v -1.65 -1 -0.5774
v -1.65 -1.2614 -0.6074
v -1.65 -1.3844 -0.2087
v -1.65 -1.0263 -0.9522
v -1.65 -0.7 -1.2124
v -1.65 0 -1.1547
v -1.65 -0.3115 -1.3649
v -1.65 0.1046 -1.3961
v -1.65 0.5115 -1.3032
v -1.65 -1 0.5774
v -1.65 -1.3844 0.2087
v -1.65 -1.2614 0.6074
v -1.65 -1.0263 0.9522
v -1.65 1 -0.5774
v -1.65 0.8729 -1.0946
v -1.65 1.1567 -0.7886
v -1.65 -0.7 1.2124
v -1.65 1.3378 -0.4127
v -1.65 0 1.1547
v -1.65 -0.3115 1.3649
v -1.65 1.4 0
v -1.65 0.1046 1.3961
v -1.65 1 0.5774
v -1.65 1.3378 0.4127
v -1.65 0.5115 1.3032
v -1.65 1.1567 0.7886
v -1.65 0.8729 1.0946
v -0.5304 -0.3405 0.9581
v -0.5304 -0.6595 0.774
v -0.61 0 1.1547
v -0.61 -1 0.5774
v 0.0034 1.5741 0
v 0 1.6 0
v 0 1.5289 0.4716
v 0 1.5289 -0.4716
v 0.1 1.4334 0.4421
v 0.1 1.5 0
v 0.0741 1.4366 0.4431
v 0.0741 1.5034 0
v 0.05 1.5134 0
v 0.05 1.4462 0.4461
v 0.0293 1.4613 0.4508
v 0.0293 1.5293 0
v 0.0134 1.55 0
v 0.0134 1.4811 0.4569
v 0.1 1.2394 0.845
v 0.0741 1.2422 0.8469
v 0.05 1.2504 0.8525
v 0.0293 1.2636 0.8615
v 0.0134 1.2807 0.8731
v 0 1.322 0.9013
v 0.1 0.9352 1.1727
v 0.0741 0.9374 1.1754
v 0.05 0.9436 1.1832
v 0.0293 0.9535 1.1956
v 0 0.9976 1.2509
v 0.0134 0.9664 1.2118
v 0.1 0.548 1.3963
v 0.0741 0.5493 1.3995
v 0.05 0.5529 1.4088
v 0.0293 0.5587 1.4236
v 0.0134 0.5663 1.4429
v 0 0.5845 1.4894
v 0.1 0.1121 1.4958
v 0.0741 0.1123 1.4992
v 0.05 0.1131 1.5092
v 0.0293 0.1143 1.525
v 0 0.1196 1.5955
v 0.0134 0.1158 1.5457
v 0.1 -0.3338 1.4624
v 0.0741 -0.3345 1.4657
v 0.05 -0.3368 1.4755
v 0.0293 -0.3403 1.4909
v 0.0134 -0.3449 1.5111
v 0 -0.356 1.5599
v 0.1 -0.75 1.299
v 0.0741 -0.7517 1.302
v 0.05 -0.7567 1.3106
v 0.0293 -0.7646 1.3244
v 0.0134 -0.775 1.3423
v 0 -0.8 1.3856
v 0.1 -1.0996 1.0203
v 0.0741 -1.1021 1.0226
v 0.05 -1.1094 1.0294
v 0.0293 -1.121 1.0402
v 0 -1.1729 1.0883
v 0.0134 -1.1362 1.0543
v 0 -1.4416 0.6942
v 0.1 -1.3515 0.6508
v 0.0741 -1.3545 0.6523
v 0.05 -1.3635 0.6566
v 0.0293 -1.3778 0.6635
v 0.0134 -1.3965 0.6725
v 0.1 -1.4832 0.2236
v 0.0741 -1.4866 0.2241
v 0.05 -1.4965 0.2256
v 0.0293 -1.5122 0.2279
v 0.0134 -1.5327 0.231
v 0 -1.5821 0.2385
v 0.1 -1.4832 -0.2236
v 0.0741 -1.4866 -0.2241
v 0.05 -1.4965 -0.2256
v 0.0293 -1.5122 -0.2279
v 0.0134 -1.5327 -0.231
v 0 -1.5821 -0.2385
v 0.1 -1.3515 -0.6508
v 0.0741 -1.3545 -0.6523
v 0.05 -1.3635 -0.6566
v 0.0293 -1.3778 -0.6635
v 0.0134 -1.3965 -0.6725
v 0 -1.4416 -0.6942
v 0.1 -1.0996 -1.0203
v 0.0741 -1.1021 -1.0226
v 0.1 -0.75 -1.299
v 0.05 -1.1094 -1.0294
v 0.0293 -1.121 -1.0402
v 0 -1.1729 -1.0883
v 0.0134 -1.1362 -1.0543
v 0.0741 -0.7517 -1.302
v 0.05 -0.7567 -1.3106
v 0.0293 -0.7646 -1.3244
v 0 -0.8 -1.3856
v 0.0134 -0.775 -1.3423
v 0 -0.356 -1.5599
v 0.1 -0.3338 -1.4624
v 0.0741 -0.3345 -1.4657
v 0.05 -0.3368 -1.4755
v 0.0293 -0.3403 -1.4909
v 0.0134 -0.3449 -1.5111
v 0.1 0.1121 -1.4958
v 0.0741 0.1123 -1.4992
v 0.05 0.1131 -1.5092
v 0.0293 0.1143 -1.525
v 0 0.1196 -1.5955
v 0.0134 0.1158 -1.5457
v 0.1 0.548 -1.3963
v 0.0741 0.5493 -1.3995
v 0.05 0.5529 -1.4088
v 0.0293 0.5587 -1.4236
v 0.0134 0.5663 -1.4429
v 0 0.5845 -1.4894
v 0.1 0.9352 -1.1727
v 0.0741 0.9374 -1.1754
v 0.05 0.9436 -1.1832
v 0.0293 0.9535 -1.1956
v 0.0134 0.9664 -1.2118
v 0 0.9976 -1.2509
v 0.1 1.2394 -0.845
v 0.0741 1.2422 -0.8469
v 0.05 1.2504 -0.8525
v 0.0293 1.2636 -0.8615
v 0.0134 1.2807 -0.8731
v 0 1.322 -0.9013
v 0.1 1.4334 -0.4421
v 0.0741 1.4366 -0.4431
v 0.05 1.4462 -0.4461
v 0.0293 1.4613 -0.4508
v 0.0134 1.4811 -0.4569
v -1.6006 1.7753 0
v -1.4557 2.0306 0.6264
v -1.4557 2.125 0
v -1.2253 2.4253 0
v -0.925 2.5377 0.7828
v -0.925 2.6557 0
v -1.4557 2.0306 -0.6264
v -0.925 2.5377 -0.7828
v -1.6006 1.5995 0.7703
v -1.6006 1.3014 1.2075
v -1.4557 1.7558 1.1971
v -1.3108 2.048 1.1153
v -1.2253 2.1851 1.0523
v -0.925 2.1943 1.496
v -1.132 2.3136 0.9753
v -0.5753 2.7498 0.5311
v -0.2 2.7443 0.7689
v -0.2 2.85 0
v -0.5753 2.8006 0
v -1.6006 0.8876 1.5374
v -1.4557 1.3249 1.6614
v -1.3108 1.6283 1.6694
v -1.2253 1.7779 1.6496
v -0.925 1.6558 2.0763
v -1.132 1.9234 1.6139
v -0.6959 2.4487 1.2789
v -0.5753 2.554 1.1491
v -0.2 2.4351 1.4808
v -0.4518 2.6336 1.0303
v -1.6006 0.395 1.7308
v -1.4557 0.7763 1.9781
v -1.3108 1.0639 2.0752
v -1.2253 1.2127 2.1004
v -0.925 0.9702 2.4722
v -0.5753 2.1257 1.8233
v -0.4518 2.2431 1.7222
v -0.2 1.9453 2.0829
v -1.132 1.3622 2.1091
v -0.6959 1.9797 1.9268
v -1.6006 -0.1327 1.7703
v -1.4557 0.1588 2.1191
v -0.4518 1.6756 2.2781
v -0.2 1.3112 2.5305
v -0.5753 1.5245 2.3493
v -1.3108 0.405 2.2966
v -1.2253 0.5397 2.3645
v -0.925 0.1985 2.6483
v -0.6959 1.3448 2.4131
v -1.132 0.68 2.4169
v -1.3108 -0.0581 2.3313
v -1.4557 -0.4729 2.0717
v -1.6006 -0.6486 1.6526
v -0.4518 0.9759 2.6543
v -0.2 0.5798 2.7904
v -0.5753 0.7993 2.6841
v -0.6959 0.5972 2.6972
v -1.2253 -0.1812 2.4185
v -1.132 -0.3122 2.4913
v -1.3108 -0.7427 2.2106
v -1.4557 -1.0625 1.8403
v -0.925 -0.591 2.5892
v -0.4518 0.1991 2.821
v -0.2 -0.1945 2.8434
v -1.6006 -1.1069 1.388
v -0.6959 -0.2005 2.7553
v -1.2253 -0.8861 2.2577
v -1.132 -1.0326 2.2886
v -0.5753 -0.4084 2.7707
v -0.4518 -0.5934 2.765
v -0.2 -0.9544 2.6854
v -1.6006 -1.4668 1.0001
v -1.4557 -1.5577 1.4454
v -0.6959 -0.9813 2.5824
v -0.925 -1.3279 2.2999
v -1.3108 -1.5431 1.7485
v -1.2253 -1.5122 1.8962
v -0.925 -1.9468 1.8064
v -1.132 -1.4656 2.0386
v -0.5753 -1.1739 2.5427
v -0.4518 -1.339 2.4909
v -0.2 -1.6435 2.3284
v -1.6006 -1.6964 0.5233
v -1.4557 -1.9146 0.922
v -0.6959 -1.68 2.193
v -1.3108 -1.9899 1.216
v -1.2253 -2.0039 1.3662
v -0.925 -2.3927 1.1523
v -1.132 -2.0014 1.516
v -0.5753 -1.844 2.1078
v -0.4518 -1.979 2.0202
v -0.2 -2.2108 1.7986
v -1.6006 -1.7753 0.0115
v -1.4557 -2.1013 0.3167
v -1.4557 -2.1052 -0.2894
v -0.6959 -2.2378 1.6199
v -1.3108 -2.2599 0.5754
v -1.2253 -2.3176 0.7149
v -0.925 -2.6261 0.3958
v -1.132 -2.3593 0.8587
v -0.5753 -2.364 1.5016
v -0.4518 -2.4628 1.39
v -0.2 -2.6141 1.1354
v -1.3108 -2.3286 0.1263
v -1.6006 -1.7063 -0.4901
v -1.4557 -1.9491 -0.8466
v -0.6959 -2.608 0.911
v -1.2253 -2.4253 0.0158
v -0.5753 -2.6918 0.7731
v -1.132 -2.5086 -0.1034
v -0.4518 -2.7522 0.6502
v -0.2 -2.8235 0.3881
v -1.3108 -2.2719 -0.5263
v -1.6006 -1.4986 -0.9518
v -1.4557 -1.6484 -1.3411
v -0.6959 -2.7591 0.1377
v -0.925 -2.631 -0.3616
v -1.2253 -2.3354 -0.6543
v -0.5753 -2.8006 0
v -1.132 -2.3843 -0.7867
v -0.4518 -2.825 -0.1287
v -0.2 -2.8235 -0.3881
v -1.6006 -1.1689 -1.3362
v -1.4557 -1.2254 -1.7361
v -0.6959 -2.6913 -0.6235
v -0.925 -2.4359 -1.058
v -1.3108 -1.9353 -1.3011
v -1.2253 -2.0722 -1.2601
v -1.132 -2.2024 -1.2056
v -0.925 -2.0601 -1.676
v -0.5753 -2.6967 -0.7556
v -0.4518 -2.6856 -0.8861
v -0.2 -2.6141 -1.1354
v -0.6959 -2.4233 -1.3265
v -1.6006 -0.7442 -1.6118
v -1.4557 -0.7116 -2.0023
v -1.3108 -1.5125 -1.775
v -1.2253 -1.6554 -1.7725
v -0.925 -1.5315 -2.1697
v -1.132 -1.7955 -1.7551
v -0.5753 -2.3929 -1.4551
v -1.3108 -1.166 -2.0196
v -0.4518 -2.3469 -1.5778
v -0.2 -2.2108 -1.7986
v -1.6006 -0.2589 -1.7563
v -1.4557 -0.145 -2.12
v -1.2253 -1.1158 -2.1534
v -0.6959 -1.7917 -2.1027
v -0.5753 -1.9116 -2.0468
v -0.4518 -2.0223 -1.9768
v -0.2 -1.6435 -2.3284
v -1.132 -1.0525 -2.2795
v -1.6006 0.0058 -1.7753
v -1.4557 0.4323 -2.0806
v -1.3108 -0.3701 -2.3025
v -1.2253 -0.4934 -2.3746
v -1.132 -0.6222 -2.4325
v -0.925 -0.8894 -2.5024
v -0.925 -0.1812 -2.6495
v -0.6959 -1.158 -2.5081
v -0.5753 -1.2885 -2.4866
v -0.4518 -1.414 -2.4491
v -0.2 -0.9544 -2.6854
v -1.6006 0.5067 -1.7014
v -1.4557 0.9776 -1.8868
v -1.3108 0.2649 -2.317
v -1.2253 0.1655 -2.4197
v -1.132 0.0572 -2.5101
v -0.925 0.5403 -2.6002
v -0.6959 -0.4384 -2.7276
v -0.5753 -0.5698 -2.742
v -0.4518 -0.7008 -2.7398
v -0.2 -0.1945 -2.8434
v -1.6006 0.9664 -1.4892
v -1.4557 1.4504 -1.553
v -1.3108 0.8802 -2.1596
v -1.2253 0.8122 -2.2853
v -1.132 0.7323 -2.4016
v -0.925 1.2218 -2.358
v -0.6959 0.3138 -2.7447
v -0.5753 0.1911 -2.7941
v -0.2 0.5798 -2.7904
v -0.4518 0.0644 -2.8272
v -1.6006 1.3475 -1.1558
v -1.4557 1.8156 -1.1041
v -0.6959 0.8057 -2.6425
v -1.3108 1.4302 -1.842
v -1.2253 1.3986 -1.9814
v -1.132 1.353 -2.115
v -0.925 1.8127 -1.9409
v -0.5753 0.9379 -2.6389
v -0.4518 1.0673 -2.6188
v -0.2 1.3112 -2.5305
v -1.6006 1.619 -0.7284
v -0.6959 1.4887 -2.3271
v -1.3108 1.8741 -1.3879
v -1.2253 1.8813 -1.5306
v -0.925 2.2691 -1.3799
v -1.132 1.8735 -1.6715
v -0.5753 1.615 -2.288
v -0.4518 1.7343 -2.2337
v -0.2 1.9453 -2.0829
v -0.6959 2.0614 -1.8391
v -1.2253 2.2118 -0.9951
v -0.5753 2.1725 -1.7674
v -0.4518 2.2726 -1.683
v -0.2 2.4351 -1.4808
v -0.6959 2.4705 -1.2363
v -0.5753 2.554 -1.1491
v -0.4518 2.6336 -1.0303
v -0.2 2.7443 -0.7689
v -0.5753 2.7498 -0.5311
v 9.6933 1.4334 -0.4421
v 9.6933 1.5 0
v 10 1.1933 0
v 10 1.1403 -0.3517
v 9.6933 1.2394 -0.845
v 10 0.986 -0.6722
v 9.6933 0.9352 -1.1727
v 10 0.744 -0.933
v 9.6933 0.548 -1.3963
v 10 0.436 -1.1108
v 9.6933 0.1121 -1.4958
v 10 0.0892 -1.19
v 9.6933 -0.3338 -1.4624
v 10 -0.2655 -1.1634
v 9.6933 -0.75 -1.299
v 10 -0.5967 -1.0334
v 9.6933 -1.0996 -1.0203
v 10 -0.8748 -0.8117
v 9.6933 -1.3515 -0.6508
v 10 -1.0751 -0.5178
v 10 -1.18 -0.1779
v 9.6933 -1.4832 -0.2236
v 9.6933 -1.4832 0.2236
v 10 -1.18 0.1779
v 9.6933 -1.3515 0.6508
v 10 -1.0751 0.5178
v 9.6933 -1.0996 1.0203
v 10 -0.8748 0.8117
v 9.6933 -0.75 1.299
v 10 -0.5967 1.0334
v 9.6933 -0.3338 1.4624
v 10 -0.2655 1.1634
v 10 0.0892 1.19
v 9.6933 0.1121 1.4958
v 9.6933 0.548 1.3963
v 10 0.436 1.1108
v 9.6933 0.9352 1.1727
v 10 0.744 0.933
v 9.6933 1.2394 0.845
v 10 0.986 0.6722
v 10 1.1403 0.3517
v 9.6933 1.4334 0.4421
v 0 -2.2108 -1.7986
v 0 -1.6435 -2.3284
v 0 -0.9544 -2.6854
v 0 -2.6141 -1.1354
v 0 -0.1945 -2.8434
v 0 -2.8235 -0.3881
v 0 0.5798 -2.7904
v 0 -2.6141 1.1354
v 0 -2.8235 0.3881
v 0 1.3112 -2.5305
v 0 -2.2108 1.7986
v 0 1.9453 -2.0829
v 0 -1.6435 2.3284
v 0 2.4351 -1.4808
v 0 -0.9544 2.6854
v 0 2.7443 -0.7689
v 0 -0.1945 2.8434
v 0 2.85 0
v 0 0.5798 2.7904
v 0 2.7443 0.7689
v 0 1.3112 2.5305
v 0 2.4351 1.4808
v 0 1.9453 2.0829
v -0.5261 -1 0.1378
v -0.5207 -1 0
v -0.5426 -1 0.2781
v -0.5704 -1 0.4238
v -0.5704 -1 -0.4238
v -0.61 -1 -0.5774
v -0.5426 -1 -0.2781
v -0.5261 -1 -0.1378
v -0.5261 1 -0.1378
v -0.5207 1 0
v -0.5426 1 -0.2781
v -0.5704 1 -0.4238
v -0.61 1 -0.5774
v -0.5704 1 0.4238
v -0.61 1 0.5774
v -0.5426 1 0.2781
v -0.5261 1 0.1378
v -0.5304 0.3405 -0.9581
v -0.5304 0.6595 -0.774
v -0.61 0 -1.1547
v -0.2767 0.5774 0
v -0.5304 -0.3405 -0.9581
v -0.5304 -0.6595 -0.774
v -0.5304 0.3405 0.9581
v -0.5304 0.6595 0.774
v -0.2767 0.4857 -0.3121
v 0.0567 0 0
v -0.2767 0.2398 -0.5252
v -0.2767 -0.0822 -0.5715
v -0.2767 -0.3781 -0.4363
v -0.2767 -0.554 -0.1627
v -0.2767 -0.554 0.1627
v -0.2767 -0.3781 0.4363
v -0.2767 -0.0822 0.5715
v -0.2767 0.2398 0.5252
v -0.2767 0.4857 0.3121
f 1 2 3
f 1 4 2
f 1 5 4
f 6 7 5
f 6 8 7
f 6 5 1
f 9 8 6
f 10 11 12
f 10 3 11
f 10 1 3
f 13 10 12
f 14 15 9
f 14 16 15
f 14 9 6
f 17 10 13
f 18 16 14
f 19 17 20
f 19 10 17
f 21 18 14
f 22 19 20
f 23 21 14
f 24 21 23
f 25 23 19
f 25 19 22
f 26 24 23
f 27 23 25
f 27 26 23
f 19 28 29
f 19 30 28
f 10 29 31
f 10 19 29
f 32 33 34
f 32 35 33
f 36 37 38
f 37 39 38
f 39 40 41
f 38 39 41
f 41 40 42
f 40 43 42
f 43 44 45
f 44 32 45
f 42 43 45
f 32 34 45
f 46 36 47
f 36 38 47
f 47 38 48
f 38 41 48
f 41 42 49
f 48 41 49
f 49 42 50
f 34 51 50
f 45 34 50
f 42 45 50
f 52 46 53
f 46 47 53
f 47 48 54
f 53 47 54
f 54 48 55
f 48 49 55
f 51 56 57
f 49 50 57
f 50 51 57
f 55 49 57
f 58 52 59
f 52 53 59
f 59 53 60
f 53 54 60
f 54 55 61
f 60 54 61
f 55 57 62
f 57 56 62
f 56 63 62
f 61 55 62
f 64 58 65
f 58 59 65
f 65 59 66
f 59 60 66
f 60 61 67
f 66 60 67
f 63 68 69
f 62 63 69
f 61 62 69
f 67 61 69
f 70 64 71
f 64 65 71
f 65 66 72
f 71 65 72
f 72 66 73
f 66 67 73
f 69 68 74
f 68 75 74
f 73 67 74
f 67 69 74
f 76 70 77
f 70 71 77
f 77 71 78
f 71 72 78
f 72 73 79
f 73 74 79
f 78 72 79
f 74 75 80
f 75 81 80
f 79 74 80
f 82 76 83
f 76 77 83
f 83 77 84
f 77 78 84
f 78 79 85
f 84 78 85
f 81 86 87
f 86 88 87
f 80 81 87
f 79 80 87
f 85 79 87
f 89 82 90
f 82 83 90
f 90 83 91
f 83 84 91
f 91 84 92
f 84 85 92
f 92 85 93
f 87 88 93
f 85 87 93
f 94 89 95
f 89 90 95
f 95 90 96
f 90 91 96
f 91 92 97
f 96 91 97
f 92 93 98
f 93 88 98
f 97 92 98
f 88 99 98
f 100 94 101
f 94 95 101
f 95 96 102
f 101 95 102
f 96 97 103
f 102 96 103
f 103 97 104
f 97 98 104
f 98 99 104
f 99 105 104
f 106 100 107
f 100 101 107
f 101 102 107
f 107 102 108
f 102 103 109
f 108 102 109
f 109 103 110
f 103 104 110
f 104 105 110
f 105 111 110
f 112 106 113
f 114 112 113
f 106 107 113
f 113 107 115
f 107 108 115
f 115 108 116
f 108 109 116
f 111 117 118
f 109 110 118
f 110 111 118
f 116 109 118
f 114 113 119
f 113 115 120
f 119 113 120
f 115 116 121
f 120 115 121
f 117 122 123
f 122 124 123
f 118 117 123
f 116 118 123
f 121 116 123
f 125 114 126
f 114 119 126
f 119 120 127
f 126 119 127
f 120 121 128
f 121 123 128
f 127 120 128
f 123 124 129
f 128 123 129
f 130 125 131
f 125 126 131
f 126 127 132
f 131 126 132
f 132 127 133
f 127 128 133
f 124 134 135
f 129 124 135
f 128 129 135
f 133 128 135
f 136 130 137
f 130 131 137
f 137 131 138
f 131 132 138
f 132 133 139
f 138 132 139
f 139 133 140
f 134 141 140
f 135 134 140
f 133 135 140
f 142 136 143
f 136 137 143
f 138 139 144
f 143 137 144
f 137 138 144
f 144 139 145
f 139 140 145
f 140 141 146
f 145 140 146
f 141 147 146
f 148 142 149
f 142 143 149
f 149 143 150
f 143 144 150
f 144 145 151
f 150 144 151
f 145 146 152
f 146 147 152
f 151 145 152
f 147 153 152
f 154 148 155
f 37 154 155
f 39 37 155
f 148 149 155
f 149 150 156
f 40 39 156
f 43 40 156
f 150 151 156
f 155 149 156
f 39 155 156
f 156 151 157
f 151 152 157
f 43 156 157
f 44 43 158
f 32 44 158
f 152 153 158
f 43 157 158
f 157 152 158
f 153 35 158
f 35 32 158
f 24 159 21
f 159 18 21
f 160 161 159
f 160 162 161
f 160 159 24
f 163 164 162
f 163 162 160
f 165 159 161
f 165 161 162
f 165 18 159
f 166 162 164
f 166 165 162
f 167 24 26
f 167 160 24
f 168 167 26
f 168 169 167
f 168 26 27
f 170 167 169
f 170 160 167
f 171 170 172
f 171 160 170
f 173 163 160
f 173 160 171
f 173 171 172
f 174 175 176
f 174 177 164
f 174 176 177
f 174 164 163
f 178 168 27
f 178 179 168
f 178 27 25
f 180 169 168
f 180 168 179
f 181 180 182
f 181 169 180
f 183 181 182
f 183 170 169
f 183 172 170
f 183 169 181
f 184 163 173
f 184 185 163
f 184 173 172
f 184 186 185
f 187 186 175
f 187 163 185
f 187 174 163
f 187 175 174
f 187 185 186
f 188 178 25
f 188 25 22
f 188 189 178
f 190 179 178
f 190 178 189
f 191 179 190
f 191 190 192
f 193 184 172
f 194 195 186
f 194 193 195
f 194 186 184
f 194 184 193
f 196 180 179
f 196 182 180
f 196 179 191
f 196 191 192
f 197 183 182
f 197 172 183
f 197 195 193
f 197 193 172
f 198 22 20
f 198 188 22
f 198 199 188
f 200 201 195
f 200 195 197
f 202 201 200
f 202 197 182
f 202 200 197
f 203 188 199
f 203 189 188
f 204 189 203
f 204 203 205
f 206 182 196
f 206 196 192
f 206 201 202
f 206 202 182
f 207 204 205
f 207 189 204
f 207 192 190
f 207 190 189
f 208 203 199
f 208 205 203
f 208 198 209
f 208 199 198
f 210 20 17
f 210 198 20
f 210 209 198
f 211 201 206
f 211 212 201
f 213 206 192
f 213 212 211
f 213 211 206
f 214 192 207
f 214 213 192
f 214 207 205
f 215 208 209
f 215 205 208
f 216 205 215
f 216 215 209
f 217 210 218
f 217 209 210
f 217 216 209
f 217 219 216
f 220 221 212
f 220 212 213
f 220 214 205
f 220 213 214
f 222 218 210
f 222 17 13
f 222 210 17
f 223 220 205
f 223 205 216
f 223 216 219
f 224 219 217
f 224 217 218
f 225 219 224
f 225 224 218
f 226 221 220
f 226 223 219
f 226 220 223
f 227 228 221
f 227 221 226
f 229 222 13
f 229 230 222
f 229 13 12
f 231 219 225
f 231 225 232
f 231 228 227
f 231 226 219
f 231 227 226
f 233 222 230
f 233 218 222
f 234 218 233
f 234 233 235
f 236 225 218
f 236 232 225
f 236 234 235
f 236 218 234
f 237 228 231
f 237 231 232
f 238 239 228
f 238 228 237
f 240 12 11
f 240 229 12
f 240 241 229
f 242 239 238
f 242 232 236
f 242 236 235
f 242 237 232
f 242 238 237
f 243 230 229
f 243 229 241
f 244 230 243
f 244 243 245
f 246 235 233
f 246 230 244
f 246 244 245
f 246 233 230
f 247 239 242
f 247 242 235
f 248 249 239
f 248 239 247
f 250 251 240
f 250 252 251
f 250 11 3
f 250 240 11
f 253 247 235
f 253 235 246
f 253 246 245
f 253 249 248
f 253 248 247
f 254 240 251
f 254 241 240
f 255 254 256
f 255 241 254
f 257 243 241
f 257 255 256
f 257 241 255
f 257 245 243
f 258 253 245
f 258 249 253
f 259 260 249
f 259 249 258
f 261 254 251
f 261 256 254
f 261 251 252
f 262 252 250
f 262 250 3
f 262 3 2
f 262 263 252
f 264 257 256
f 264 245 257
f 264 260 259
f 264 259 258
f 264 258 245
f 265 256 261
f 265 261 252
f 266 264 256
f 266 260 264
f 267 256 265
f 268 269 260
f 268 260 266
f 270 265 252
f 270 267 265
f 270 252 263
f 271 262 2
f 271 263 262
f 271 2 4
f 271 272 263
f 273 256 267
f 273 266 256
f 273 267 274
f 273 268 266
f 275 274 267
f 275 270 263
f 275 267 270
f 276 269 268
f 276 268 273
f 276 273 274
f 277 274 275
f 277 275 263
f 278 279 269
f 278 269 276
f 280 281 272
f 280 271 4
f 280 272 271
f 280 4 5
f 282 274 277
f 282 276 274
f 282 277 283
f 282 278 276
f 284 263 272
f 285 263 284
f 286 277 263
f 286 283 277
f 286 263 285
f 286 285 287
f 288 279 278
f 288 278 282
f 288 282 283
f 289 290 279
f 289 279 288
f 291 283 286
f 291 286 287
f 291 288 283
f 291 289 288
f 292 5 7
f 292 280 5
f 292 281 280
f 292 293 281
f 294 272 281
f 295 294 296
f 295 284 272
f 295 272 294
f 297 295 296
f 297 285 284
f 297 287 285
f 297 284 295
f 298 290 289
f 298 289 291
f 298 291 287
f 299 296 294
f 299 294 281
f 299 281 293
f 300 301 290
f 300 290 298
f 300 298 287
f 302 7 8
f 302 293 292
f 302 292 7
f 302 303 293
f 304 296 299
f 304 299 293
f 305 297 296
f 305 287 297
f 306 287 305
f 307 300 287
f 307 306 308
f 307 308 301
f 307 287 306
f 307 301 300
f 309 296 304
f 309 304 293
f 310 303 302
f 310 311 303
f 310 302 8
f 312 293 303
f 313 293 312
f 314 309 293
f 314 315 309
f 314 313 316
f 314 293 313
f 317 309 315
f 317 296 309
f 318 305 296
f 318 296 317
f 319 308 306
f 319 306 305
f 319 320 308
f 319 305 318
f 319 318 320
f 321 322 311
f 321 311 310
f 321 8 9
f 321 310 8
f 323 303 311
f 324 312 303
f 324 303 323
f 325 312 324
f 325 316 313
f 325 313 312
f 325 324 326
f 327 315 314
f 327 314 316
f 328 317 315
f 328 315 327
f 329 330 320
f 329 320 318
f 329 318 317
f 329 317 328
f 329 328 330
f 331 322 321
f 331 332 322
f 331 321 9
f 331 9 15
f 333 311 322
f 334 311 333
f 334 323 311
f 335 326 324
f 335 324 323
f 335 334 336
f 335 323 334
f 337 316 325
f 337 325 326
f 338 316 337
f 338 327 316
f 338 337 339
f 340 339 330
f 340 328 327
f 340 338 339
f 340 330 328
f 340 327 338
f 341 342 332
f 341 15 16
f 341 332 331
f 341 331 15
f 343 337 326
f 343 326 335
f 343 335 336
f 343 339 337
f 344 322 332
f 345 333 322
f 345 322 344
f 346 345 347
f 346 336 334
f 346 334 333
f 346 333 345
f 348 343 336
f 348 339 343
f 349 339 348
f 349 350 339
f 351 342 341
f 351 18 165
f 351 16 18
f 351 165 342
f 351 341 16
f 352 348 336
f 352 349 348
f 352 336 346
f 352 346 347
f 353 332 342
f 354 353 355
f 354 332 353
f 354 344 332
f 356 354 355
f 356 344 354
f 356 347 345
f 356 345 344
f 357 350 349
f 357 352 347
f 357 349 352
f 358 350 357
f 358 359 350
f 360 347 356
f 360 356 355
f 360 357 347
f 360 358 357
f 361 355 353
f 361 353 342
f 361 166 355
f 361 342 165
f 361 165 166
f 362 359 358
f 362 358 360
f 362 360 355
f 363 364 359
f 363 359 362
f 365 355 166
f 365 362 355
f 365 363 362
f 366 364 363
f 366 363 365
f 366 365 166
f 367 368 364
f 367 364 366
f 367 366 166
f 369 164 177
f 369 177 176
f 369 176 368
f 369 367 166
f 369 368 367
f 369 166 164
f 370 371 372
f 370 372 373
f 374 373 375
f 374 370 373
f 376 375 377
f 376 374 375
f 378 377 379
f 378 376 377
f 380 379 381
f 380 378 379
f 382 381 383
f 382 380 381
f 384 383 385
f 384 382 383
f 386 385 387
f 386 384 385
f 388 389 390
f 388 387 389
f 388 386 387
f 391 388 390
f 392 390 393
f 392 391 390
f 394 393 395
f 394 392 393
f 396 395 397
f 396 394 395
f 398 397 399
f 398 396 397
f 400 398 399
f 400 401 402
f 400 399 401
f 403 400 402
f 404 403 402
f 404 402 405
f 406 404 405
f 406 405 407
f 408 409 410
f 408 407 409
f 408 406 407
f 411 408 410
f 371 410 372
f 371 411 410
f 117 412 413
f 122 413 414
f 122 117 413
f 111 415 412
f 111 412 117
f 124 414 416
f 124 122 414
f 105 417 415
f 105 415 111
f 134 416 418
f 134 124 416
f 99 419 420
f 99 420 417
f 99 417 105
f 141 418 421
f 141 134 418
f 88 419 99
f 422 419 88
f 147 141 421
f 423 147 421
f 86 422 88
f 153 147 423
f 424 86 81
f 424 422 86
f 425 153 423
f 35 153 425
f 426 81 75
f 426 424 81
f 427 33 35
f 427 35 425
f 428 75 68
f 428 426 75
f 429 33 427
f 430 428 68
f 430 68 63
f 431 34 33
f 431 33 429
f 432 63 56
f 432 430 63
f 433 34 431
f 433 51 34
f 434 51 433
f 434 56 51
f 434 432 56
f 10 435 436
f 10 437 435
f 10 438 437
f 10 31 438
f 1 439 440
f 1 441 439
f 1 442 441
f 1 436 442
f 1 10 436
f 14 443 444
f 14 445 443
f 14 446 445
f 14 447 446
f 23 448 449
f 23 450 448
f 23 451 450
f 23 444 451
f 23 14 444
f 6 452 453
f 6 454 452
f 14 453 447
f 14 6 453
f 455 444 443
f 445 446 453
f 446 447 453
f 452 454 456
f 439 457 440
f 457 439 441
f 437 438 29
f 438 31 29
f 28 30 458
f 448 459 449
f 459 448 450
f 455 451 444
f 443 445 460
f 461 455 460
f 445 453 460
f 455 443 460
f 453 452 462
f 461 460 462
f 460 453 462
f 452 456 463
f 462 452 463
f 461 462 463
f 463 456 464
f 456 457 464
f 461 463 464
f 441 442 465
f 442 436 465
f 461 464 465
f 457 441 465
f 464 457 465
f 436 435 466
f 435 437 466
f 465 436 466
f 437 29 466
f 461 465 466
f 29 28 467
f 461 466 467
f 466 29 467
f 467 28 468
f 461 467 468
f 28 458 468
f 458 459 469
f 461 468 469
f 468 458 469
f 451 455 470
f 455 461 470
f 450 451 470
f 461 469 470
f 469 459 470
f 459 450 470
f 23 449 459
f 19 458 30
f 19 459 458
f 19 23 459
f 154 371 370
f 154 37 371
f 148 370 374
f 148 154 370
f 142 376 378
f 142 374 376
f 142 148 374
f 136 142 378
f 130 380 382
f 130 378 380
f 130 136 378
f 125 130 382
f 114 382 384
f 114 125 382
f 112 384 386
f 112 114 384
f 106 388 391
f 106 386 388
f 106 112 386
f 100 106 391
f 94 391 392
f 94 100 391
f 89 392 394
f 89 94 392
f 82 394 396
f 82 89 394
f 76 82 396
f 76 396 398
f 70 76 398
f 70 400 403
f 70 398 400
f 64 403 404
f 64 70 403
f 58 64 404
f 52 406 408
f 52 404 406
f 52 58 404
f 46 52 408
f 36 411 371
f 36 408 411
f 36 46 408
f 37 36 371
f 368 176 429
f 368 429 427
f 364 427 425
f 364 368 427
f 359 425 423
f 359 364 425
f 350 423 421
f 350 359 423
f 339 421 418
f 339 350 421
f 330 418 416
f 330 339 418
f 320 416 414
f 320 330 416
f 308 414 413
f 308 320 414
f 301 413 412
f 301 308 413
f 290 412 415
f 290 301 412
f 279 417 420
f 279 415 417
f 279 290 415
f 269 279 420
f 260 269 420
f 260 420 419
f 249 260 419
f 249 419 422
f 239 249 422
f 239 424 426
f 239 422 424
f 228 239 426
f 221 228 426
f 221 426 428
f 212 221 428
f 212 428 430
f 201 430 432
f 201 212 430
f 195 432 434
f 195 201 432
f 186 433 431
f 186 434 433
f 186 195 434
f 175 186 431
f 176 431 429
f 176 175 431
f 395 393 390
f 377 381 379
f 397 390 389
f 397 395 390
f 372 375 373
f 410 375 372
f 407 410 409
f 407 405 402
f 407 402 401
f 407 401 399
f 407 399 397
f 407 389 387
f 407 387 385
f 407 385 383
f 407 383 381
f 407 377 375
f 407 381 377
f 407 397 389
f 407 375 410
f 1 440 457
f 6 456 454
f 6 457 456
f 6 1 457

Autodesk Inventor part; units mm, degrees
ref_plane "YZ Plane" through (0, 0, 0) normal (1, 0, 0) x (0, 1, 0)
ref_plane "XZ Plane" through (0, 0, 0) normal (0, 1, 0) x (-1, 0, 0)
sketch "Sketch1" plane through (0, 0, 0) normal (0, 0, 1) x (1, 0, 0)
  line L0 (0.0567, 0) -> (10, 0)
  line L1 (10, 0) -> (10, 1.5)
  line L2 (10, 1.5) -> (1, 1.5)
  line L3 (1, 1.5) -> (0.6932, 1.5)
  line L4 (0.6932, 1.5) -> (0, 1.5)
  line L5 (0, 1.5) -> (0, 2.85)
  line L6 (0, 2.85) -> (-1.65, 2.85)
  line L7 (-1.65, 2.85) -> (-1.65, 1.1547)
  line L8 (-1.65, 1.1547) -> (-0.61, 1.1547)
  line L9 (-0.61, 1.1547) -> (0.0567, 0)
  line L10 (-3.98, 0) -> (12.33, 0) projected
  line L11 (0, -0.57) -> (0, 3.42) projected
  line L12 (1, 1.5) -> (0, 1.5) construction
  dimension "d1" = 9
  dimension "d2" = 0.3068
  dimension "d3" = 1.65
  dimension "d4" = 1.04
  dimension "d5" = 60
  dimension "d6" = 3
  dimension "d7" = 3
  dimension "d8" = 2.3094
  dimension "d9" = 5.7
  dimension "d26" = 10
revolve "Body" add sketch "Sketch1" angle 360 about axis through (0.0567, 0, 0) along (1, 0, 0) contours L9 L11 L4 L3 L2 L1 L0 | L9 L8 L7 L6 L5 L11
sketch "Sketch2" plane through (-1.65, 0, 0) normal (-1, 0, 0) x (0, 0, 1)
  circle A0 centre (0, 0) radius 1.1547 projected
  line L0 (0, -3.99) -> (0, 3.99) projected
  line L1 (-3.99, 0) -> (3.99, 0) projected
  line L2 (1.1547, 0) -> (0.5774, -1)
  line L3 (0.5774, -1) -> (-0.5774, -1)
  line L4 (-0.5774, -1) -> (-1.1547, 0)
  line L5 (-1.1547, 0) -> (-0.5774, 1)
  line L6 (-0.5774, 1) -> (0.5774, 1)
  line L7 (0.5774, 1) -> (1.1547, 0)
extrude "Slot" add sketch "Sketch2" against normal up to next contours L7 A0 | A0 L2 | L6 L0 A0 | A0 L0 L3 | L0 L6 A0 | A0 L3 L0 | L4 A0 | A0 L5
fillet "Fillet1" radius 1.45 1 edges at (-1.65, -2.85, 0)
thread "Thread" size "M3x0.5" class "6g" standard "ISO Metric profile" length 9
chamfer "Chamfer1" distance 0.3067 distance2 0.3067 1 edges at (10, -1.5, 0) measured on face at (10, -0.6587, -0.1791)
ref_plane "Work Plane1" through (29, 0, 0) normal (0, -1, 0) x (1, 0, 0)
fillet "Fillet2" radius 0.1 1 edges at (0, -1.5, 0)
equation "\"d1\" = GEL"
equation "\"d3\" = KOH"
equation "\"d4\" = INTI"
equation "\"d6\" = GD"
equation "\"d7\" = BDM"
equation "\"d8\" = 1.1547 * SW"
equation "\"d9\" = KOD"
equation "\"d26\" = NLG"
equation "\"d30\" = R"
equation "\"d17\" = RR"
equation "\"d13\" = GEL"
equation "\"d15\" = -0.5 * SPD + 0.5 * GD"
equation "\"d16\" = GUL"
equation "\"GD\" = 3"
equation "\"NLG\" = 10"
equation "\"GEL\" = 9"
equation "\"KOD\" = 5.7"
equation "\"KOH\" = 1.65"
equation "\"INTI\" = 1.04"
equation "\"GAL\" = 0.30673"
equation "\"GUL\" = 0.30673"
equation "\"BDM\" = 3"
equation "\"SW\" = 2"
equation "\"RR\" = 1.45"
equation "\"SPD\" = 2.38655"
equation "\"R\" = 0.1"
equation "\"TOA\" = 30deg"
equation "\"GD1\" = 2.38655"
equation "\"THREADDIA\" = 3"
equation "\"PTC\" = 0.5"
equation "\"NND\" = 3"
equation "\"KOH1\" = 0.2"
equation "\"E0\" = 2.31"
properties part number "M3 x 10 - Socket Button Head (A2)" material "Steel, Alloy"
